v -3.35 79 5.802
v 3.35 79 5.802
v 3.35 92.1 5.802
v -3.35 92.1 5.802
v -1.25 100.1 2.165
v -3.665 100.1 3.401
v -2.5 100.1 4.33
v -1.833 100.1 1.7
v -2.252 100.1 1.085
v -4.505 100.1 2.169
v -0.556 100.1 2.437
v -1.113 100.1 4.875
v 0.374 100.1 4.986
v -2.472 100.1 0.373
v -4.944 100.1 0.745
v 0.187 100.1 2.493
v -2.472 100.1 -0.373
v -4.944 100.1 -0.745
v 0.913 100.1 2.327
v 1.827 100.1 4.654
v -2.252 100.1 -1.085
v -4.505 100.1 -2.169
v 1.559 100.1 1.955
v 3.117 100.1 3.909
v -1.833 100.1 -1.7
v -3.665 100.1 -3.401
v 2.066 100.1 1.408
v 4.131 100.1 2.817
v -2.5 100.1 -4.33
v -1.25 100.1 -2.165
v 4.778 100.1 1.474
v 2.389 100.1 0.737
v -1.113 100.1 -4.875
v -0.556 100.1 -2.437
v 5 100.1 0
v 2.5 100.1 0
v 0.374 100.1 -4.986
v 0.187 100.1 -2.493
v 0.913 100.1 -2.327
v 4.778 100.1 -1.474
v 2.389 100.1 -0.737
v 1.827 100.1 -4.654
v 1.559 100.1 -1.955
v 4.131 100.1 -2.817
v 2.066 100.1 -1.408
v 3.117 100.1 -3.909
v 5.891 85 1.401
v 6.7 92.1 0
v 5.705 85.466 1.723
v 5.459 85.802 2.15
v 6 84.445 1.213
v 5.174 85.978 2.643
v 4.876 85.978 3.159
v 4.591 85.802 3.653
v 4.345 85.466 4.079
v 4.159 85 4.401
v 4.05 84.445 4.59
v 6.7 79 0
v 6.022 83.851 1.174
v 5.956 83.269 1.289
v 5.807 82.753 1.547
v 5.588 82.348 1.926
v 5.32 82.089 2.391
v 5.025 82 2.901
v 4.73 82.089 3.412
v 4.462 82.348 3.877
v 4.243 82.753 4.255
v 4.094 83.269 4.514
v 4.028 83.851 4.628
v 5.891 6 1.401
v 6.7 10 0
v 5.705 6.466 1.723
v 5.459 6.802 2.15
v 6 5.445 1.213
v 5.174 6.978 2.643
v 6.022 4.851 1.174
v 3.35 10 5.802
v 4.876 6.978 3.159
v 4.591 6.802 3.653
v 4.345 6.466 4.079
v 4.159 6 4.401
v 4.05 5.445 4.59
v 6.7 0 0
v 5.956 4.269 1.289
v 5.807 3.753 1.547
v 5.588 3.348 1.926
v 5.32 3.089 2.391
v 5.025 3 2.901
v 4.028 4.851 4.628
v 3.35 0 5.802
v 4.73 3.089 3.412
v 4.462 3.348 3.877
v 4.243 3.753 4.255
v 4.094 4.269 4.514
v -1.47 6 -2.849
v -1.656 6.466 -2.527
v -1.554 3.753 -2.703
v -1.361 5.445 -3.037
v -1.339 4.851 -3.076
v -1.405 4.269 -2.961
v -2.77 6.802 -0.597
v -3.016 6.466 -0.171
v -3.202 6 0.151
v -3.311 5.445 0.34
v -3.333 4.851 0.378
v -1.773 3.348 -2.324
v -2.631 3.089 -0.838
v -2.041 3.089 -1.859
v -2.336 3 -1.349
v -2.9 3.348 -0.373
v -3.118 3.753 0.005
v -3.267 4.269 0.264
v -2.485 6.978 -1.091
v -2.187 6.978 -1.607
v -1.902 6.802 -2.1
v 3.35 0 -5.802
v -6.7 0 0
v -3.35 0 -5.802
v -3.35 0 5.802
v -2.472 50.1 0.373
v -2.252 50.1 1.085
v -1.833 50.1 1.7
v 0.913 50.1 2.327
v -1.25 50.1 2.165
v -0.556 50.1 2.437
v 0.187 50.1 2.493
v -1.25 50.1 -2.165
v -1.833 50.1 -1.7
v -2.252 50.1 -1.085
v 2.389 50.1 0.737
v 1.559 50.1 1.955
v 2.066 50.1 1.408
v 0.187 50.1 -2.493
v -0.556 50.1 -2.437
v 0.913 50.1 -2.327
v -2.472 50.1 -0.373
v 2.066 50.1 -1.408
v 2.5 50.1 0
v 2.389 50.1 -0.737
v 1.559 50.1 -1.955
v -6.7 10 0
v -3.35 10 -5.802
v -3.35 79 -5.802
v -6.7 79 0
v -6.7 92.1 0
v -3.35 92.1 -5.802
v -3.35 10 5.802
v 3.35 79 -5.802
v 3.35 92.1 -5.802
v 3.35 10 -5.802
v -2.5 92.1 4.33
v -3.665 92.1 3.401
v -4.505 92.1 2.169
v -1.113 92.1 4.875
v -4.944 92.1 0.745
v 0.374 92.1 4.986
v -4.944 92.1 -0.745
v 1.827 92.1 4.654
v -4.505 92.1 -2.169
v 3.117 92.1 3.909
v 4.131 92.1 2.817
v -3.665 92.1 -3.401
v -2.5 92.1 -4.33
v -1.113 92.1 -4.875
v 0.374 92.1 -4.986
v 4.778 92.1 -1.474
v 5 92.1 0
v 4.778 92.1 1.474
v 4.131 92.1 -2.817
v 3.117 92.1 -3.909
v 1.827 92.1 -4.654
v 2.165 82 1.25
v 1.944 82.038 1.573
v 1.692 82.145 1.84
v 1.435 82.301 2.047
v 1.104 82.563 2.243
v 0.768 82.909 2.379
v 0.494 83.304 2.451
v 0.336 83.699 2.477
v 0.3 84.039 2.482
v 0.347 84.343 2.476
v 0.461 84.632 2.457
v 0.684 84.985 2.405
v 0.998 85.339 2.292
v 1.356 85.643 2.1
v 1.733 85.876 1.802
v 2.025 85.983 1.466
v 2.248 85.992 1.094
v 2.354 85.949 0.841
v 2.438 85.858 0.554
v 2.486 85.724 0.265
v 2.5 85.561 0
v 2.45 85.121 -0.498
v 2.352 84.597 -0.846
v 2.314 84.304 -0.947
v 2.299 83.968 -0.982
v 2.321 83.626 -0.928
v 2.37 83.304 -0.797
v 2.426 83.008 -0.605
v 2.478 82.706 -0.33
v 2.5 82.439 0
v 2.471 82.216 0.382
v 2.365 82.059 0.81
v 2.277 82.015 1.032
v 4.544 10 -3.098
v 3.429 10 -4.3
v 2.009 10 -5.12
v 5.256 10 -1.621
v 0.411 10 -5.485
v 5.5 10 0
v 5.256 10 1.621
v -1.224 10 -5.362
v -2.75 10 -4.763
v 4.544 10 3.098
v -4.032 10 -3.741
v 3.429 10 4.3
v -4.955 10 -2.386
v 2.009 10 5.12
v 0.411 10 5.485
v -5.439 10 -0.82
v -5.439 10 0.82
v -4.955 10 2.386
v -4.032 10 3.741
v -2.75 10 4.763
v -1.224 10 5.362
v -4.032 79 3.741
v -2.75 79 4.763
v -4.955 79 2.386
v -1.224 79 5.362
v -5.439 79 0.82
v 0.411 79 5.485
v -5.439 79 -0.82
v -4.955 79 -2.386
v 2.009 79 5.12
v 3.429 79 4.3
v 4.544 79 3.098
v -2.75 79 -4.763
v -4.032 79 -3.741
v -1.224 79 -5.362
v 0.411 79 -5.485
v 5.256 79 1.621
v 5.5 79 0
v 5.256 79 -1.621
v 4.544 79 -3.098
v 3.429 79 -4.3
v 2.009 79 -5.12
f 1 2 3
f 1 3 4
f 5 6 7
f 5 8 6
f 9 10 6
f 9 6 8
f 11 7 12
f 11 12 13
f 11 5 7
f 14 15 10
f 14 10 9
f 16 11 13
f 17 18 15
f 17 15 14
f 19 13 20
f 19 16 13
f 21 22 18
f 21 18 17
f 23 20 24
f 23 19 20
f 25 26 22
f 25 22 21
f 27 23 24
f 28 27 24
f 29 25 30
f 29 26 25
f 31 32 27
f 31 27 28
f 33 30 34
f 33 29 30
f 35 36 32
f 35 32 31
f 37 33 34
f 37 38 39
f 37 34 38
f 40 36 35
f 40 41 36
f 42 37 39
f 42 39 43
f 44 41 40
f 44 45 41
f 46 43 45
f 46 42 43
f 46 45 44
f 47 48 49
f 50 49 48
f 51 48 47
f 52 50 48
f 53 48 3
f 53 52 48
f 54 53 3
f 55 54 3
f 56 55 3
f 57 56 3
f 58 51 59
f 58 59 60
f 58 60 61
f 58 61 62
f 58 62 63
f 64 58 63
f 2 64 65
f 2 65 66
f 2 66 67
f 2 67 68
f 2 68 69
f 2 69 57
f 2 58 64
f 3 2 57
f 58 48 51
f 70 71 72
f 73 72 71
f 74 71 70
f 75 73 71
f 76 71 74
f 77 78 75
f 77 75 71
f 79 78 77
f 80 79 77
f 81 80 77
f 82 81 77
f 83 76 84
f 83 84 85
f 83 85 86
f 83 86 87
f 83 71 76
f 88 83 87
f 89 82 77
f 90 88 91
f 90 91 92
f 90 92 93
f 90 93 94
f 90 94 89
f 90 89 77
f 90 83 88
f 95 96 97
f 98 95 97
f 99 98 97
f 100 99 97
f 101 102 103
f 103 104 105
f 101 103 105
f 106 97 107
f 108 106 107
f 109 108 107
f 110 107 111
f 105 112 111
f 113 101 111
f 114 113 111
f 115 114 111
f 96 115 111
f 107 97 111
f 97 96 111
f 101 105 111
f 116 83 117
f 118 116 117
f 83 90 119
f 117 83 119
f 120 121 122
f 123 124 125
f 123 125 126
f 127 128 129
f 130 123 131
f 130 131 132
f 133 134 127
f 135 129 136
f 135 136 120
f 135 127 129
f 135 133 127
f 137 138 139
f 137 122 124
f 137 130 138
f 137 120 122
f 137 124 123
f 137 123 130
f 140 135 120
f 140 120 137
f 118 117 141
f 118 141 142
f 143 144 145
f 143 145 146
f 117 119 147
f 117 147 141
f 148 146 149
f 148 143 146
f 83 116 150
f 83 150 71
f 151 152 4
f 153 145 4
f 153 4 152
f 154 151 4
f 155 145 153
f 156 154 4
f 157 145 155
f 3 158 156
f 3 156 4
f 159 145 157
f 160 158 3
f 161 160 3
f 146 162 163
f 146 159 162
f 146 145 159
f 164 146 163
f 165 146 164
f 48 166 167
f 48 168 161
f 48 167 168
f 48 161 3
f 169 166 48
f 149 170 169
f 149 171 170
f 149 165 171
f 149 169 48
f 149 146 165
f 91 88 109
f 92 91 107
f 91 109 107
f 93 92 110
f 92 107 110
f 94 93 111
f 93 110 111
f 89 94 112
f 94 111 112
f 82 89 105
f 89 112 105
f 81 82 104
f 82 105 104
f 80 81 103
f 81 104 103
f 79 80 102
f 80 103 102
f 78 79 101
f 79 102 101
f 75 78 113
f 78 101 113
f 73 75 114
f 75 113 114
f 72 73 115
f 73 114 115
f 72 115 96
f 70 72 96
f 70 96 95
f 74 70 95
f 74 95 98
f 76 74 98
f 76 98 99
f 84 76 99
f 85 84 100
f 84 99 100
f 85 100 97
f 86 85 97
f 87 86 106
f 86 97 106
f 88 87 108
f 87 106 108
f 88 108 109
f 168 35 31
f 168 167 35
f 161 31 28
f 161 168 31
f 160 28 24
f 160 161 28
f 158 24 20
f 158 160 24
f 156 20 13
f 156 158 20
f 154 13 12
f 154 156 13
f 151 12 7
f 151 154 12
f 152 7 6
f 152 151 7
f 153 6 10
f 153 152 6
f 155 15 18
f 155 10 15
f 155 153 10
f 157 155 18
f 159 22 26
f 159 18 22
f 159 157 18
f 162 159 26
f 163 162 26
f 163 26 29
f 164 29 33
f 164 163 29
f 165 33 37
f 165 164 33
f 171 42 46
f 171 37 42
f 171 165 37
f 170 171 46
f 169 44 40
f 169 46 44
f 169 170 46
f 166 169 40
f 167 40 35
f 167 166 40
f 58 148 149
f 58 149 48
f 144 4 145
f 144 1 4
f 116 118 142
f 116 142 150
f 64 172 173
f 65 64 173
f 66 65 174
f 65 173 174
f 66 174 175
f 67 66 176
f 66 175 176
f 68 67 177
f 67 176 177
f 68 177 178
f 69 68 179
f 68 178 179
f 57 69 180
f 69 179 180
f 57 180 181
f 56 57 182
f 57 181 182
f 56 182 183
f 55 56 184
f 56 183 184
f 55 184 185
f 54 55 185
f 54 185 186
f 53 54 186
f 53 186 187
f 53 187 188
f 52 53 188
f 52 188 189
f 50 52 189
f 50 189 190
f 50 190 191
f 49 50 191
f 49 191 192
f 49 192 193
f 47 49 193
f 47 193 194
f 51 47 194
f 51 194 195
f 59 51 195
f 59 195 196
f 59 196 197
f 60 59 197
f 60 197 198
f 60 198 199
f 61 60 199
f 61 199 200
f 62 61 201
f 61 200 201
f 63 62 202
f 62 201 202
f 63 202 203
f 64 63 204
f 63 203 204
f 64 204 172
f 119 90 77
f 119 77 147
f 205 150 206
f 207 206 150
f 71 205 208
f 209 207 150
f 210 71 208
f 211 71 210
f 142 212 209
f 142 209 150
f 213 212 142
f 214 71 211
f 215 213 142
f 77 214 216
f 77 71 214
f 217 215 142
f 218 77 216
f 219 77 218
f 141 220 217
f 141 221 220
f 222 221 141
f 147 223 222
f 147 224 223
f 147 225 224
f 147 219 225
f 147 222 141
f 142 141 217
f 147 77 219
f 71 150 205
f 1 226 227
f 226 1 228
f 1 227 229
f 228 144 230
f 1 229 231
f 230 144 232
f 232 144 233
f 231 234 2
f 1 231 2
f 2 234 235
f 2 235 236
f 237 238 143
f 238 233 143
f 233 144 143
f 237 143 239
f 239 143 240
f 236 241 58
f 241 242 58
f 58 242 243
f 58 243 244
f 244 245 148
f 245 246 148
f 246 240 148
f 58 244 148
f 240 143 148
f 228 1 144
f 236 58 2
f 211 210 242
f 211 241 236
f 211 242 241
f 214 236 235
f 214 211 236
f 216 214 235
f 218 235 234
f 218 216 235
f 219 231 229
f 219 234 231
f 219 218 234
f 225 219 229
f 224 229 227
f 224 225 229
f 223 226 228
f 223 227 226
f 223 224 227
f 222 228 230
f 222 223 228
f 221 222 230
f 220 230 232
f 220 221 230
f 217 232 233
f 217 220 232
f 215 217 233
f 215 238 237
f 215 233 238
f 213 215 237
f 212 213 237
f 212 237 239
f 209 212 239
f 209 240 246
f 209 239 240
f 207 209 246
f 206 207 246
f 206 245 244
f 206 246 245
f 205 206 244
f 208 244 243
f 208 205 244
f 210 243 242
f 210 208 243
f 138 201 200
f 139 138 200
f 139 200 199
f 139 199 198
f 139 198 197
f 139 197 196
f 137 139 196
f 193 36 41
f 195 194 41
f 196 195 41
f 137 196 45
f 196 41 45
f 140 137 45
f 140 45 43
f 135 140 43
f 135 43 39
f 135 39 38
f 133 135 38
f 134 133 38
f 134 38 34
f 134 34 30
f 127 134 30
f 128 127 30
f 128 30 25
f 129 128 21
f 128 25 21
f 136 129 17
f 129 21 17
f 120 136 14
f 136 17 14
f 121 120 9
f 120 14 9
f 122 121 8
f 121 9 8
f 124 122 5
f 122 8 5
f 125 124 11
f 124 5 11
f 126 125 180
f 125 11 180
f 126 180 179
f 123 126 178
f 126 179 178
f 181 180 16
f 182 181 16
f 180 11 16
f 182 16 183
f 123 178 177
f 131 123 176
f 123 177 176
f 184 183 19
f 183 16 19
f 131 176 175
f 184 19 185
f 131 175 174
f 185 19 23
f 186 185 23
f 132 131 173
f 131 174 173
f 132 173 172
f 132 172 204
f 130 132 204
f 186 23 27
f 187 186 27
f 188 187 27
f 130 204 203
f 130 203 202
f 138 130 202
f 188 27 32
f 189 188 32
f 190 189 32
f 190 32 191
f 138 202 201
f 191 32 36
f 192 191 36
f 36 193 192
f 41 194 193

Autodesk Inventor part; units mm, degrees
ref_plane "YZ Plane" through (0, 0, 0) normal (1, 0, 0) x (0, 1, 0)
ref_plane "XZ Plane" through (0, 0, 0) normal (0, 1, 0) x (-1, 0, 0)
ref_plane "XY Plane" through (0, 0, 0) normal (0, 0, 1) x (1, 0, 0)
sketch "スケッチ1" plane through (0, 0, 0) normal (0, 1, 0) x (-1, 0, 0)
  line L0 (6.7, 0) -> (3.35, -5.8024)
  line L1 (3.35, -5.8024) -> (-3.35, -5.8024)
  line L2 (-3.35, -5.8024) -> (-6.7, 0)
  line L3 (-6.7, 0) -> (-3.35, 5.8024)
  line L4 (-3.35, 5.8024) -> (3.35, 5.8024)
  line L5 (3.35, 5.8024) -> (6.7, 0)
  point P0 (0, 0)
  point P1 (0, 0)
  dimension "d0" = 6.7
extrude "押し出し1" add sketch "スケッチ1" along normal blind 10
sketch "スケッチ2" plane through (0, 10, 0) normal (0, 1, 0) x (1, 0, 0)
  circle A0 centre (0, 0) radius 5.5
  dimension "d3" = 11
extrude "押し出し2" add sketch "スケッチ2" along normal blind 69
sketch "スケッチ3" plane through (0, 79, 0) normal (0, 1, 0) x (1, 0, 0)
  line L0 (-6.7, 0) -> (-3.35, 5.8024)
  line L1 (-3.35, 5.8024) -> (3.35, 5.8024)
  line L2 (3.35, 5.8024) -> (6.7, 0)
  line L3 (6.7, 0) -> (3.35, -5.8024)
  line L4 (3.35, -5.8024) -> (-3.35, -5.8024)
  line L5 (-3.35, -5.8024) -> (-6.7, 0)
  point P0 (0, 0)
  point P1 (0, 0)
extrude "押し出し3" add sketch "スケッチ3" along normal blind 13.1
sketch "スケッチ4" plane through (0, 92.1, 0) normal (0, 1, 0) x (1, 0, 0)
  circle A0 centre (0, 0) radius 5
  dimension "d8" = 10
extrude "押し出し4" add sketch "スケッチ4" along normal blind 8
sketch "スケッチ5" plane through (0, 100.1, 0) normal (0, 1, 0) x (1, 0, 0)
  circle A0 centre (0, 0) radius 2.5
  dimension "d11" = 5
extrude "押し出し5" cut sketch "スケッチ5" against normal blind 50
sketch "スケッチ6" plane through (6.7, 0, 0) normal (0.866, 0, 0.5) x (0.5, 0, -0.866)
  line L0 (-3.35, 0) -> (-3.35, 10)
  line L1 (-8.85, 10) -> (2.15, 10) projected
  point P0 (-3.35, 5)
hole "穴1" at (5.025, 5, 2.9012) direction (-0.866, 0, -0.5) diameter 4 depth 8.5
sketch "スケッチ7" plane through (6.7, 79, 0) normal (0.866, 0, 0.5) x (0.5, 0, -0.866)
  line L0 (0, 0) -> (-6.7, 0) projected
  line L1 (-3.35, 0) -> (-3.35, 13.1)
  line L2 (-6.7, 13.1) -> (0, 13.1) projected
  point P0 (-3.35, -79)
  point P1 (-3.35, 5)
  dimension "d21" = 5
hole "穴2" at (5.025, 84, 2.9012) direction (-0.866, 0, -0.5) diameter 4 depth 5
properties part number "SMC_CJ1KB10-45(本体)"
